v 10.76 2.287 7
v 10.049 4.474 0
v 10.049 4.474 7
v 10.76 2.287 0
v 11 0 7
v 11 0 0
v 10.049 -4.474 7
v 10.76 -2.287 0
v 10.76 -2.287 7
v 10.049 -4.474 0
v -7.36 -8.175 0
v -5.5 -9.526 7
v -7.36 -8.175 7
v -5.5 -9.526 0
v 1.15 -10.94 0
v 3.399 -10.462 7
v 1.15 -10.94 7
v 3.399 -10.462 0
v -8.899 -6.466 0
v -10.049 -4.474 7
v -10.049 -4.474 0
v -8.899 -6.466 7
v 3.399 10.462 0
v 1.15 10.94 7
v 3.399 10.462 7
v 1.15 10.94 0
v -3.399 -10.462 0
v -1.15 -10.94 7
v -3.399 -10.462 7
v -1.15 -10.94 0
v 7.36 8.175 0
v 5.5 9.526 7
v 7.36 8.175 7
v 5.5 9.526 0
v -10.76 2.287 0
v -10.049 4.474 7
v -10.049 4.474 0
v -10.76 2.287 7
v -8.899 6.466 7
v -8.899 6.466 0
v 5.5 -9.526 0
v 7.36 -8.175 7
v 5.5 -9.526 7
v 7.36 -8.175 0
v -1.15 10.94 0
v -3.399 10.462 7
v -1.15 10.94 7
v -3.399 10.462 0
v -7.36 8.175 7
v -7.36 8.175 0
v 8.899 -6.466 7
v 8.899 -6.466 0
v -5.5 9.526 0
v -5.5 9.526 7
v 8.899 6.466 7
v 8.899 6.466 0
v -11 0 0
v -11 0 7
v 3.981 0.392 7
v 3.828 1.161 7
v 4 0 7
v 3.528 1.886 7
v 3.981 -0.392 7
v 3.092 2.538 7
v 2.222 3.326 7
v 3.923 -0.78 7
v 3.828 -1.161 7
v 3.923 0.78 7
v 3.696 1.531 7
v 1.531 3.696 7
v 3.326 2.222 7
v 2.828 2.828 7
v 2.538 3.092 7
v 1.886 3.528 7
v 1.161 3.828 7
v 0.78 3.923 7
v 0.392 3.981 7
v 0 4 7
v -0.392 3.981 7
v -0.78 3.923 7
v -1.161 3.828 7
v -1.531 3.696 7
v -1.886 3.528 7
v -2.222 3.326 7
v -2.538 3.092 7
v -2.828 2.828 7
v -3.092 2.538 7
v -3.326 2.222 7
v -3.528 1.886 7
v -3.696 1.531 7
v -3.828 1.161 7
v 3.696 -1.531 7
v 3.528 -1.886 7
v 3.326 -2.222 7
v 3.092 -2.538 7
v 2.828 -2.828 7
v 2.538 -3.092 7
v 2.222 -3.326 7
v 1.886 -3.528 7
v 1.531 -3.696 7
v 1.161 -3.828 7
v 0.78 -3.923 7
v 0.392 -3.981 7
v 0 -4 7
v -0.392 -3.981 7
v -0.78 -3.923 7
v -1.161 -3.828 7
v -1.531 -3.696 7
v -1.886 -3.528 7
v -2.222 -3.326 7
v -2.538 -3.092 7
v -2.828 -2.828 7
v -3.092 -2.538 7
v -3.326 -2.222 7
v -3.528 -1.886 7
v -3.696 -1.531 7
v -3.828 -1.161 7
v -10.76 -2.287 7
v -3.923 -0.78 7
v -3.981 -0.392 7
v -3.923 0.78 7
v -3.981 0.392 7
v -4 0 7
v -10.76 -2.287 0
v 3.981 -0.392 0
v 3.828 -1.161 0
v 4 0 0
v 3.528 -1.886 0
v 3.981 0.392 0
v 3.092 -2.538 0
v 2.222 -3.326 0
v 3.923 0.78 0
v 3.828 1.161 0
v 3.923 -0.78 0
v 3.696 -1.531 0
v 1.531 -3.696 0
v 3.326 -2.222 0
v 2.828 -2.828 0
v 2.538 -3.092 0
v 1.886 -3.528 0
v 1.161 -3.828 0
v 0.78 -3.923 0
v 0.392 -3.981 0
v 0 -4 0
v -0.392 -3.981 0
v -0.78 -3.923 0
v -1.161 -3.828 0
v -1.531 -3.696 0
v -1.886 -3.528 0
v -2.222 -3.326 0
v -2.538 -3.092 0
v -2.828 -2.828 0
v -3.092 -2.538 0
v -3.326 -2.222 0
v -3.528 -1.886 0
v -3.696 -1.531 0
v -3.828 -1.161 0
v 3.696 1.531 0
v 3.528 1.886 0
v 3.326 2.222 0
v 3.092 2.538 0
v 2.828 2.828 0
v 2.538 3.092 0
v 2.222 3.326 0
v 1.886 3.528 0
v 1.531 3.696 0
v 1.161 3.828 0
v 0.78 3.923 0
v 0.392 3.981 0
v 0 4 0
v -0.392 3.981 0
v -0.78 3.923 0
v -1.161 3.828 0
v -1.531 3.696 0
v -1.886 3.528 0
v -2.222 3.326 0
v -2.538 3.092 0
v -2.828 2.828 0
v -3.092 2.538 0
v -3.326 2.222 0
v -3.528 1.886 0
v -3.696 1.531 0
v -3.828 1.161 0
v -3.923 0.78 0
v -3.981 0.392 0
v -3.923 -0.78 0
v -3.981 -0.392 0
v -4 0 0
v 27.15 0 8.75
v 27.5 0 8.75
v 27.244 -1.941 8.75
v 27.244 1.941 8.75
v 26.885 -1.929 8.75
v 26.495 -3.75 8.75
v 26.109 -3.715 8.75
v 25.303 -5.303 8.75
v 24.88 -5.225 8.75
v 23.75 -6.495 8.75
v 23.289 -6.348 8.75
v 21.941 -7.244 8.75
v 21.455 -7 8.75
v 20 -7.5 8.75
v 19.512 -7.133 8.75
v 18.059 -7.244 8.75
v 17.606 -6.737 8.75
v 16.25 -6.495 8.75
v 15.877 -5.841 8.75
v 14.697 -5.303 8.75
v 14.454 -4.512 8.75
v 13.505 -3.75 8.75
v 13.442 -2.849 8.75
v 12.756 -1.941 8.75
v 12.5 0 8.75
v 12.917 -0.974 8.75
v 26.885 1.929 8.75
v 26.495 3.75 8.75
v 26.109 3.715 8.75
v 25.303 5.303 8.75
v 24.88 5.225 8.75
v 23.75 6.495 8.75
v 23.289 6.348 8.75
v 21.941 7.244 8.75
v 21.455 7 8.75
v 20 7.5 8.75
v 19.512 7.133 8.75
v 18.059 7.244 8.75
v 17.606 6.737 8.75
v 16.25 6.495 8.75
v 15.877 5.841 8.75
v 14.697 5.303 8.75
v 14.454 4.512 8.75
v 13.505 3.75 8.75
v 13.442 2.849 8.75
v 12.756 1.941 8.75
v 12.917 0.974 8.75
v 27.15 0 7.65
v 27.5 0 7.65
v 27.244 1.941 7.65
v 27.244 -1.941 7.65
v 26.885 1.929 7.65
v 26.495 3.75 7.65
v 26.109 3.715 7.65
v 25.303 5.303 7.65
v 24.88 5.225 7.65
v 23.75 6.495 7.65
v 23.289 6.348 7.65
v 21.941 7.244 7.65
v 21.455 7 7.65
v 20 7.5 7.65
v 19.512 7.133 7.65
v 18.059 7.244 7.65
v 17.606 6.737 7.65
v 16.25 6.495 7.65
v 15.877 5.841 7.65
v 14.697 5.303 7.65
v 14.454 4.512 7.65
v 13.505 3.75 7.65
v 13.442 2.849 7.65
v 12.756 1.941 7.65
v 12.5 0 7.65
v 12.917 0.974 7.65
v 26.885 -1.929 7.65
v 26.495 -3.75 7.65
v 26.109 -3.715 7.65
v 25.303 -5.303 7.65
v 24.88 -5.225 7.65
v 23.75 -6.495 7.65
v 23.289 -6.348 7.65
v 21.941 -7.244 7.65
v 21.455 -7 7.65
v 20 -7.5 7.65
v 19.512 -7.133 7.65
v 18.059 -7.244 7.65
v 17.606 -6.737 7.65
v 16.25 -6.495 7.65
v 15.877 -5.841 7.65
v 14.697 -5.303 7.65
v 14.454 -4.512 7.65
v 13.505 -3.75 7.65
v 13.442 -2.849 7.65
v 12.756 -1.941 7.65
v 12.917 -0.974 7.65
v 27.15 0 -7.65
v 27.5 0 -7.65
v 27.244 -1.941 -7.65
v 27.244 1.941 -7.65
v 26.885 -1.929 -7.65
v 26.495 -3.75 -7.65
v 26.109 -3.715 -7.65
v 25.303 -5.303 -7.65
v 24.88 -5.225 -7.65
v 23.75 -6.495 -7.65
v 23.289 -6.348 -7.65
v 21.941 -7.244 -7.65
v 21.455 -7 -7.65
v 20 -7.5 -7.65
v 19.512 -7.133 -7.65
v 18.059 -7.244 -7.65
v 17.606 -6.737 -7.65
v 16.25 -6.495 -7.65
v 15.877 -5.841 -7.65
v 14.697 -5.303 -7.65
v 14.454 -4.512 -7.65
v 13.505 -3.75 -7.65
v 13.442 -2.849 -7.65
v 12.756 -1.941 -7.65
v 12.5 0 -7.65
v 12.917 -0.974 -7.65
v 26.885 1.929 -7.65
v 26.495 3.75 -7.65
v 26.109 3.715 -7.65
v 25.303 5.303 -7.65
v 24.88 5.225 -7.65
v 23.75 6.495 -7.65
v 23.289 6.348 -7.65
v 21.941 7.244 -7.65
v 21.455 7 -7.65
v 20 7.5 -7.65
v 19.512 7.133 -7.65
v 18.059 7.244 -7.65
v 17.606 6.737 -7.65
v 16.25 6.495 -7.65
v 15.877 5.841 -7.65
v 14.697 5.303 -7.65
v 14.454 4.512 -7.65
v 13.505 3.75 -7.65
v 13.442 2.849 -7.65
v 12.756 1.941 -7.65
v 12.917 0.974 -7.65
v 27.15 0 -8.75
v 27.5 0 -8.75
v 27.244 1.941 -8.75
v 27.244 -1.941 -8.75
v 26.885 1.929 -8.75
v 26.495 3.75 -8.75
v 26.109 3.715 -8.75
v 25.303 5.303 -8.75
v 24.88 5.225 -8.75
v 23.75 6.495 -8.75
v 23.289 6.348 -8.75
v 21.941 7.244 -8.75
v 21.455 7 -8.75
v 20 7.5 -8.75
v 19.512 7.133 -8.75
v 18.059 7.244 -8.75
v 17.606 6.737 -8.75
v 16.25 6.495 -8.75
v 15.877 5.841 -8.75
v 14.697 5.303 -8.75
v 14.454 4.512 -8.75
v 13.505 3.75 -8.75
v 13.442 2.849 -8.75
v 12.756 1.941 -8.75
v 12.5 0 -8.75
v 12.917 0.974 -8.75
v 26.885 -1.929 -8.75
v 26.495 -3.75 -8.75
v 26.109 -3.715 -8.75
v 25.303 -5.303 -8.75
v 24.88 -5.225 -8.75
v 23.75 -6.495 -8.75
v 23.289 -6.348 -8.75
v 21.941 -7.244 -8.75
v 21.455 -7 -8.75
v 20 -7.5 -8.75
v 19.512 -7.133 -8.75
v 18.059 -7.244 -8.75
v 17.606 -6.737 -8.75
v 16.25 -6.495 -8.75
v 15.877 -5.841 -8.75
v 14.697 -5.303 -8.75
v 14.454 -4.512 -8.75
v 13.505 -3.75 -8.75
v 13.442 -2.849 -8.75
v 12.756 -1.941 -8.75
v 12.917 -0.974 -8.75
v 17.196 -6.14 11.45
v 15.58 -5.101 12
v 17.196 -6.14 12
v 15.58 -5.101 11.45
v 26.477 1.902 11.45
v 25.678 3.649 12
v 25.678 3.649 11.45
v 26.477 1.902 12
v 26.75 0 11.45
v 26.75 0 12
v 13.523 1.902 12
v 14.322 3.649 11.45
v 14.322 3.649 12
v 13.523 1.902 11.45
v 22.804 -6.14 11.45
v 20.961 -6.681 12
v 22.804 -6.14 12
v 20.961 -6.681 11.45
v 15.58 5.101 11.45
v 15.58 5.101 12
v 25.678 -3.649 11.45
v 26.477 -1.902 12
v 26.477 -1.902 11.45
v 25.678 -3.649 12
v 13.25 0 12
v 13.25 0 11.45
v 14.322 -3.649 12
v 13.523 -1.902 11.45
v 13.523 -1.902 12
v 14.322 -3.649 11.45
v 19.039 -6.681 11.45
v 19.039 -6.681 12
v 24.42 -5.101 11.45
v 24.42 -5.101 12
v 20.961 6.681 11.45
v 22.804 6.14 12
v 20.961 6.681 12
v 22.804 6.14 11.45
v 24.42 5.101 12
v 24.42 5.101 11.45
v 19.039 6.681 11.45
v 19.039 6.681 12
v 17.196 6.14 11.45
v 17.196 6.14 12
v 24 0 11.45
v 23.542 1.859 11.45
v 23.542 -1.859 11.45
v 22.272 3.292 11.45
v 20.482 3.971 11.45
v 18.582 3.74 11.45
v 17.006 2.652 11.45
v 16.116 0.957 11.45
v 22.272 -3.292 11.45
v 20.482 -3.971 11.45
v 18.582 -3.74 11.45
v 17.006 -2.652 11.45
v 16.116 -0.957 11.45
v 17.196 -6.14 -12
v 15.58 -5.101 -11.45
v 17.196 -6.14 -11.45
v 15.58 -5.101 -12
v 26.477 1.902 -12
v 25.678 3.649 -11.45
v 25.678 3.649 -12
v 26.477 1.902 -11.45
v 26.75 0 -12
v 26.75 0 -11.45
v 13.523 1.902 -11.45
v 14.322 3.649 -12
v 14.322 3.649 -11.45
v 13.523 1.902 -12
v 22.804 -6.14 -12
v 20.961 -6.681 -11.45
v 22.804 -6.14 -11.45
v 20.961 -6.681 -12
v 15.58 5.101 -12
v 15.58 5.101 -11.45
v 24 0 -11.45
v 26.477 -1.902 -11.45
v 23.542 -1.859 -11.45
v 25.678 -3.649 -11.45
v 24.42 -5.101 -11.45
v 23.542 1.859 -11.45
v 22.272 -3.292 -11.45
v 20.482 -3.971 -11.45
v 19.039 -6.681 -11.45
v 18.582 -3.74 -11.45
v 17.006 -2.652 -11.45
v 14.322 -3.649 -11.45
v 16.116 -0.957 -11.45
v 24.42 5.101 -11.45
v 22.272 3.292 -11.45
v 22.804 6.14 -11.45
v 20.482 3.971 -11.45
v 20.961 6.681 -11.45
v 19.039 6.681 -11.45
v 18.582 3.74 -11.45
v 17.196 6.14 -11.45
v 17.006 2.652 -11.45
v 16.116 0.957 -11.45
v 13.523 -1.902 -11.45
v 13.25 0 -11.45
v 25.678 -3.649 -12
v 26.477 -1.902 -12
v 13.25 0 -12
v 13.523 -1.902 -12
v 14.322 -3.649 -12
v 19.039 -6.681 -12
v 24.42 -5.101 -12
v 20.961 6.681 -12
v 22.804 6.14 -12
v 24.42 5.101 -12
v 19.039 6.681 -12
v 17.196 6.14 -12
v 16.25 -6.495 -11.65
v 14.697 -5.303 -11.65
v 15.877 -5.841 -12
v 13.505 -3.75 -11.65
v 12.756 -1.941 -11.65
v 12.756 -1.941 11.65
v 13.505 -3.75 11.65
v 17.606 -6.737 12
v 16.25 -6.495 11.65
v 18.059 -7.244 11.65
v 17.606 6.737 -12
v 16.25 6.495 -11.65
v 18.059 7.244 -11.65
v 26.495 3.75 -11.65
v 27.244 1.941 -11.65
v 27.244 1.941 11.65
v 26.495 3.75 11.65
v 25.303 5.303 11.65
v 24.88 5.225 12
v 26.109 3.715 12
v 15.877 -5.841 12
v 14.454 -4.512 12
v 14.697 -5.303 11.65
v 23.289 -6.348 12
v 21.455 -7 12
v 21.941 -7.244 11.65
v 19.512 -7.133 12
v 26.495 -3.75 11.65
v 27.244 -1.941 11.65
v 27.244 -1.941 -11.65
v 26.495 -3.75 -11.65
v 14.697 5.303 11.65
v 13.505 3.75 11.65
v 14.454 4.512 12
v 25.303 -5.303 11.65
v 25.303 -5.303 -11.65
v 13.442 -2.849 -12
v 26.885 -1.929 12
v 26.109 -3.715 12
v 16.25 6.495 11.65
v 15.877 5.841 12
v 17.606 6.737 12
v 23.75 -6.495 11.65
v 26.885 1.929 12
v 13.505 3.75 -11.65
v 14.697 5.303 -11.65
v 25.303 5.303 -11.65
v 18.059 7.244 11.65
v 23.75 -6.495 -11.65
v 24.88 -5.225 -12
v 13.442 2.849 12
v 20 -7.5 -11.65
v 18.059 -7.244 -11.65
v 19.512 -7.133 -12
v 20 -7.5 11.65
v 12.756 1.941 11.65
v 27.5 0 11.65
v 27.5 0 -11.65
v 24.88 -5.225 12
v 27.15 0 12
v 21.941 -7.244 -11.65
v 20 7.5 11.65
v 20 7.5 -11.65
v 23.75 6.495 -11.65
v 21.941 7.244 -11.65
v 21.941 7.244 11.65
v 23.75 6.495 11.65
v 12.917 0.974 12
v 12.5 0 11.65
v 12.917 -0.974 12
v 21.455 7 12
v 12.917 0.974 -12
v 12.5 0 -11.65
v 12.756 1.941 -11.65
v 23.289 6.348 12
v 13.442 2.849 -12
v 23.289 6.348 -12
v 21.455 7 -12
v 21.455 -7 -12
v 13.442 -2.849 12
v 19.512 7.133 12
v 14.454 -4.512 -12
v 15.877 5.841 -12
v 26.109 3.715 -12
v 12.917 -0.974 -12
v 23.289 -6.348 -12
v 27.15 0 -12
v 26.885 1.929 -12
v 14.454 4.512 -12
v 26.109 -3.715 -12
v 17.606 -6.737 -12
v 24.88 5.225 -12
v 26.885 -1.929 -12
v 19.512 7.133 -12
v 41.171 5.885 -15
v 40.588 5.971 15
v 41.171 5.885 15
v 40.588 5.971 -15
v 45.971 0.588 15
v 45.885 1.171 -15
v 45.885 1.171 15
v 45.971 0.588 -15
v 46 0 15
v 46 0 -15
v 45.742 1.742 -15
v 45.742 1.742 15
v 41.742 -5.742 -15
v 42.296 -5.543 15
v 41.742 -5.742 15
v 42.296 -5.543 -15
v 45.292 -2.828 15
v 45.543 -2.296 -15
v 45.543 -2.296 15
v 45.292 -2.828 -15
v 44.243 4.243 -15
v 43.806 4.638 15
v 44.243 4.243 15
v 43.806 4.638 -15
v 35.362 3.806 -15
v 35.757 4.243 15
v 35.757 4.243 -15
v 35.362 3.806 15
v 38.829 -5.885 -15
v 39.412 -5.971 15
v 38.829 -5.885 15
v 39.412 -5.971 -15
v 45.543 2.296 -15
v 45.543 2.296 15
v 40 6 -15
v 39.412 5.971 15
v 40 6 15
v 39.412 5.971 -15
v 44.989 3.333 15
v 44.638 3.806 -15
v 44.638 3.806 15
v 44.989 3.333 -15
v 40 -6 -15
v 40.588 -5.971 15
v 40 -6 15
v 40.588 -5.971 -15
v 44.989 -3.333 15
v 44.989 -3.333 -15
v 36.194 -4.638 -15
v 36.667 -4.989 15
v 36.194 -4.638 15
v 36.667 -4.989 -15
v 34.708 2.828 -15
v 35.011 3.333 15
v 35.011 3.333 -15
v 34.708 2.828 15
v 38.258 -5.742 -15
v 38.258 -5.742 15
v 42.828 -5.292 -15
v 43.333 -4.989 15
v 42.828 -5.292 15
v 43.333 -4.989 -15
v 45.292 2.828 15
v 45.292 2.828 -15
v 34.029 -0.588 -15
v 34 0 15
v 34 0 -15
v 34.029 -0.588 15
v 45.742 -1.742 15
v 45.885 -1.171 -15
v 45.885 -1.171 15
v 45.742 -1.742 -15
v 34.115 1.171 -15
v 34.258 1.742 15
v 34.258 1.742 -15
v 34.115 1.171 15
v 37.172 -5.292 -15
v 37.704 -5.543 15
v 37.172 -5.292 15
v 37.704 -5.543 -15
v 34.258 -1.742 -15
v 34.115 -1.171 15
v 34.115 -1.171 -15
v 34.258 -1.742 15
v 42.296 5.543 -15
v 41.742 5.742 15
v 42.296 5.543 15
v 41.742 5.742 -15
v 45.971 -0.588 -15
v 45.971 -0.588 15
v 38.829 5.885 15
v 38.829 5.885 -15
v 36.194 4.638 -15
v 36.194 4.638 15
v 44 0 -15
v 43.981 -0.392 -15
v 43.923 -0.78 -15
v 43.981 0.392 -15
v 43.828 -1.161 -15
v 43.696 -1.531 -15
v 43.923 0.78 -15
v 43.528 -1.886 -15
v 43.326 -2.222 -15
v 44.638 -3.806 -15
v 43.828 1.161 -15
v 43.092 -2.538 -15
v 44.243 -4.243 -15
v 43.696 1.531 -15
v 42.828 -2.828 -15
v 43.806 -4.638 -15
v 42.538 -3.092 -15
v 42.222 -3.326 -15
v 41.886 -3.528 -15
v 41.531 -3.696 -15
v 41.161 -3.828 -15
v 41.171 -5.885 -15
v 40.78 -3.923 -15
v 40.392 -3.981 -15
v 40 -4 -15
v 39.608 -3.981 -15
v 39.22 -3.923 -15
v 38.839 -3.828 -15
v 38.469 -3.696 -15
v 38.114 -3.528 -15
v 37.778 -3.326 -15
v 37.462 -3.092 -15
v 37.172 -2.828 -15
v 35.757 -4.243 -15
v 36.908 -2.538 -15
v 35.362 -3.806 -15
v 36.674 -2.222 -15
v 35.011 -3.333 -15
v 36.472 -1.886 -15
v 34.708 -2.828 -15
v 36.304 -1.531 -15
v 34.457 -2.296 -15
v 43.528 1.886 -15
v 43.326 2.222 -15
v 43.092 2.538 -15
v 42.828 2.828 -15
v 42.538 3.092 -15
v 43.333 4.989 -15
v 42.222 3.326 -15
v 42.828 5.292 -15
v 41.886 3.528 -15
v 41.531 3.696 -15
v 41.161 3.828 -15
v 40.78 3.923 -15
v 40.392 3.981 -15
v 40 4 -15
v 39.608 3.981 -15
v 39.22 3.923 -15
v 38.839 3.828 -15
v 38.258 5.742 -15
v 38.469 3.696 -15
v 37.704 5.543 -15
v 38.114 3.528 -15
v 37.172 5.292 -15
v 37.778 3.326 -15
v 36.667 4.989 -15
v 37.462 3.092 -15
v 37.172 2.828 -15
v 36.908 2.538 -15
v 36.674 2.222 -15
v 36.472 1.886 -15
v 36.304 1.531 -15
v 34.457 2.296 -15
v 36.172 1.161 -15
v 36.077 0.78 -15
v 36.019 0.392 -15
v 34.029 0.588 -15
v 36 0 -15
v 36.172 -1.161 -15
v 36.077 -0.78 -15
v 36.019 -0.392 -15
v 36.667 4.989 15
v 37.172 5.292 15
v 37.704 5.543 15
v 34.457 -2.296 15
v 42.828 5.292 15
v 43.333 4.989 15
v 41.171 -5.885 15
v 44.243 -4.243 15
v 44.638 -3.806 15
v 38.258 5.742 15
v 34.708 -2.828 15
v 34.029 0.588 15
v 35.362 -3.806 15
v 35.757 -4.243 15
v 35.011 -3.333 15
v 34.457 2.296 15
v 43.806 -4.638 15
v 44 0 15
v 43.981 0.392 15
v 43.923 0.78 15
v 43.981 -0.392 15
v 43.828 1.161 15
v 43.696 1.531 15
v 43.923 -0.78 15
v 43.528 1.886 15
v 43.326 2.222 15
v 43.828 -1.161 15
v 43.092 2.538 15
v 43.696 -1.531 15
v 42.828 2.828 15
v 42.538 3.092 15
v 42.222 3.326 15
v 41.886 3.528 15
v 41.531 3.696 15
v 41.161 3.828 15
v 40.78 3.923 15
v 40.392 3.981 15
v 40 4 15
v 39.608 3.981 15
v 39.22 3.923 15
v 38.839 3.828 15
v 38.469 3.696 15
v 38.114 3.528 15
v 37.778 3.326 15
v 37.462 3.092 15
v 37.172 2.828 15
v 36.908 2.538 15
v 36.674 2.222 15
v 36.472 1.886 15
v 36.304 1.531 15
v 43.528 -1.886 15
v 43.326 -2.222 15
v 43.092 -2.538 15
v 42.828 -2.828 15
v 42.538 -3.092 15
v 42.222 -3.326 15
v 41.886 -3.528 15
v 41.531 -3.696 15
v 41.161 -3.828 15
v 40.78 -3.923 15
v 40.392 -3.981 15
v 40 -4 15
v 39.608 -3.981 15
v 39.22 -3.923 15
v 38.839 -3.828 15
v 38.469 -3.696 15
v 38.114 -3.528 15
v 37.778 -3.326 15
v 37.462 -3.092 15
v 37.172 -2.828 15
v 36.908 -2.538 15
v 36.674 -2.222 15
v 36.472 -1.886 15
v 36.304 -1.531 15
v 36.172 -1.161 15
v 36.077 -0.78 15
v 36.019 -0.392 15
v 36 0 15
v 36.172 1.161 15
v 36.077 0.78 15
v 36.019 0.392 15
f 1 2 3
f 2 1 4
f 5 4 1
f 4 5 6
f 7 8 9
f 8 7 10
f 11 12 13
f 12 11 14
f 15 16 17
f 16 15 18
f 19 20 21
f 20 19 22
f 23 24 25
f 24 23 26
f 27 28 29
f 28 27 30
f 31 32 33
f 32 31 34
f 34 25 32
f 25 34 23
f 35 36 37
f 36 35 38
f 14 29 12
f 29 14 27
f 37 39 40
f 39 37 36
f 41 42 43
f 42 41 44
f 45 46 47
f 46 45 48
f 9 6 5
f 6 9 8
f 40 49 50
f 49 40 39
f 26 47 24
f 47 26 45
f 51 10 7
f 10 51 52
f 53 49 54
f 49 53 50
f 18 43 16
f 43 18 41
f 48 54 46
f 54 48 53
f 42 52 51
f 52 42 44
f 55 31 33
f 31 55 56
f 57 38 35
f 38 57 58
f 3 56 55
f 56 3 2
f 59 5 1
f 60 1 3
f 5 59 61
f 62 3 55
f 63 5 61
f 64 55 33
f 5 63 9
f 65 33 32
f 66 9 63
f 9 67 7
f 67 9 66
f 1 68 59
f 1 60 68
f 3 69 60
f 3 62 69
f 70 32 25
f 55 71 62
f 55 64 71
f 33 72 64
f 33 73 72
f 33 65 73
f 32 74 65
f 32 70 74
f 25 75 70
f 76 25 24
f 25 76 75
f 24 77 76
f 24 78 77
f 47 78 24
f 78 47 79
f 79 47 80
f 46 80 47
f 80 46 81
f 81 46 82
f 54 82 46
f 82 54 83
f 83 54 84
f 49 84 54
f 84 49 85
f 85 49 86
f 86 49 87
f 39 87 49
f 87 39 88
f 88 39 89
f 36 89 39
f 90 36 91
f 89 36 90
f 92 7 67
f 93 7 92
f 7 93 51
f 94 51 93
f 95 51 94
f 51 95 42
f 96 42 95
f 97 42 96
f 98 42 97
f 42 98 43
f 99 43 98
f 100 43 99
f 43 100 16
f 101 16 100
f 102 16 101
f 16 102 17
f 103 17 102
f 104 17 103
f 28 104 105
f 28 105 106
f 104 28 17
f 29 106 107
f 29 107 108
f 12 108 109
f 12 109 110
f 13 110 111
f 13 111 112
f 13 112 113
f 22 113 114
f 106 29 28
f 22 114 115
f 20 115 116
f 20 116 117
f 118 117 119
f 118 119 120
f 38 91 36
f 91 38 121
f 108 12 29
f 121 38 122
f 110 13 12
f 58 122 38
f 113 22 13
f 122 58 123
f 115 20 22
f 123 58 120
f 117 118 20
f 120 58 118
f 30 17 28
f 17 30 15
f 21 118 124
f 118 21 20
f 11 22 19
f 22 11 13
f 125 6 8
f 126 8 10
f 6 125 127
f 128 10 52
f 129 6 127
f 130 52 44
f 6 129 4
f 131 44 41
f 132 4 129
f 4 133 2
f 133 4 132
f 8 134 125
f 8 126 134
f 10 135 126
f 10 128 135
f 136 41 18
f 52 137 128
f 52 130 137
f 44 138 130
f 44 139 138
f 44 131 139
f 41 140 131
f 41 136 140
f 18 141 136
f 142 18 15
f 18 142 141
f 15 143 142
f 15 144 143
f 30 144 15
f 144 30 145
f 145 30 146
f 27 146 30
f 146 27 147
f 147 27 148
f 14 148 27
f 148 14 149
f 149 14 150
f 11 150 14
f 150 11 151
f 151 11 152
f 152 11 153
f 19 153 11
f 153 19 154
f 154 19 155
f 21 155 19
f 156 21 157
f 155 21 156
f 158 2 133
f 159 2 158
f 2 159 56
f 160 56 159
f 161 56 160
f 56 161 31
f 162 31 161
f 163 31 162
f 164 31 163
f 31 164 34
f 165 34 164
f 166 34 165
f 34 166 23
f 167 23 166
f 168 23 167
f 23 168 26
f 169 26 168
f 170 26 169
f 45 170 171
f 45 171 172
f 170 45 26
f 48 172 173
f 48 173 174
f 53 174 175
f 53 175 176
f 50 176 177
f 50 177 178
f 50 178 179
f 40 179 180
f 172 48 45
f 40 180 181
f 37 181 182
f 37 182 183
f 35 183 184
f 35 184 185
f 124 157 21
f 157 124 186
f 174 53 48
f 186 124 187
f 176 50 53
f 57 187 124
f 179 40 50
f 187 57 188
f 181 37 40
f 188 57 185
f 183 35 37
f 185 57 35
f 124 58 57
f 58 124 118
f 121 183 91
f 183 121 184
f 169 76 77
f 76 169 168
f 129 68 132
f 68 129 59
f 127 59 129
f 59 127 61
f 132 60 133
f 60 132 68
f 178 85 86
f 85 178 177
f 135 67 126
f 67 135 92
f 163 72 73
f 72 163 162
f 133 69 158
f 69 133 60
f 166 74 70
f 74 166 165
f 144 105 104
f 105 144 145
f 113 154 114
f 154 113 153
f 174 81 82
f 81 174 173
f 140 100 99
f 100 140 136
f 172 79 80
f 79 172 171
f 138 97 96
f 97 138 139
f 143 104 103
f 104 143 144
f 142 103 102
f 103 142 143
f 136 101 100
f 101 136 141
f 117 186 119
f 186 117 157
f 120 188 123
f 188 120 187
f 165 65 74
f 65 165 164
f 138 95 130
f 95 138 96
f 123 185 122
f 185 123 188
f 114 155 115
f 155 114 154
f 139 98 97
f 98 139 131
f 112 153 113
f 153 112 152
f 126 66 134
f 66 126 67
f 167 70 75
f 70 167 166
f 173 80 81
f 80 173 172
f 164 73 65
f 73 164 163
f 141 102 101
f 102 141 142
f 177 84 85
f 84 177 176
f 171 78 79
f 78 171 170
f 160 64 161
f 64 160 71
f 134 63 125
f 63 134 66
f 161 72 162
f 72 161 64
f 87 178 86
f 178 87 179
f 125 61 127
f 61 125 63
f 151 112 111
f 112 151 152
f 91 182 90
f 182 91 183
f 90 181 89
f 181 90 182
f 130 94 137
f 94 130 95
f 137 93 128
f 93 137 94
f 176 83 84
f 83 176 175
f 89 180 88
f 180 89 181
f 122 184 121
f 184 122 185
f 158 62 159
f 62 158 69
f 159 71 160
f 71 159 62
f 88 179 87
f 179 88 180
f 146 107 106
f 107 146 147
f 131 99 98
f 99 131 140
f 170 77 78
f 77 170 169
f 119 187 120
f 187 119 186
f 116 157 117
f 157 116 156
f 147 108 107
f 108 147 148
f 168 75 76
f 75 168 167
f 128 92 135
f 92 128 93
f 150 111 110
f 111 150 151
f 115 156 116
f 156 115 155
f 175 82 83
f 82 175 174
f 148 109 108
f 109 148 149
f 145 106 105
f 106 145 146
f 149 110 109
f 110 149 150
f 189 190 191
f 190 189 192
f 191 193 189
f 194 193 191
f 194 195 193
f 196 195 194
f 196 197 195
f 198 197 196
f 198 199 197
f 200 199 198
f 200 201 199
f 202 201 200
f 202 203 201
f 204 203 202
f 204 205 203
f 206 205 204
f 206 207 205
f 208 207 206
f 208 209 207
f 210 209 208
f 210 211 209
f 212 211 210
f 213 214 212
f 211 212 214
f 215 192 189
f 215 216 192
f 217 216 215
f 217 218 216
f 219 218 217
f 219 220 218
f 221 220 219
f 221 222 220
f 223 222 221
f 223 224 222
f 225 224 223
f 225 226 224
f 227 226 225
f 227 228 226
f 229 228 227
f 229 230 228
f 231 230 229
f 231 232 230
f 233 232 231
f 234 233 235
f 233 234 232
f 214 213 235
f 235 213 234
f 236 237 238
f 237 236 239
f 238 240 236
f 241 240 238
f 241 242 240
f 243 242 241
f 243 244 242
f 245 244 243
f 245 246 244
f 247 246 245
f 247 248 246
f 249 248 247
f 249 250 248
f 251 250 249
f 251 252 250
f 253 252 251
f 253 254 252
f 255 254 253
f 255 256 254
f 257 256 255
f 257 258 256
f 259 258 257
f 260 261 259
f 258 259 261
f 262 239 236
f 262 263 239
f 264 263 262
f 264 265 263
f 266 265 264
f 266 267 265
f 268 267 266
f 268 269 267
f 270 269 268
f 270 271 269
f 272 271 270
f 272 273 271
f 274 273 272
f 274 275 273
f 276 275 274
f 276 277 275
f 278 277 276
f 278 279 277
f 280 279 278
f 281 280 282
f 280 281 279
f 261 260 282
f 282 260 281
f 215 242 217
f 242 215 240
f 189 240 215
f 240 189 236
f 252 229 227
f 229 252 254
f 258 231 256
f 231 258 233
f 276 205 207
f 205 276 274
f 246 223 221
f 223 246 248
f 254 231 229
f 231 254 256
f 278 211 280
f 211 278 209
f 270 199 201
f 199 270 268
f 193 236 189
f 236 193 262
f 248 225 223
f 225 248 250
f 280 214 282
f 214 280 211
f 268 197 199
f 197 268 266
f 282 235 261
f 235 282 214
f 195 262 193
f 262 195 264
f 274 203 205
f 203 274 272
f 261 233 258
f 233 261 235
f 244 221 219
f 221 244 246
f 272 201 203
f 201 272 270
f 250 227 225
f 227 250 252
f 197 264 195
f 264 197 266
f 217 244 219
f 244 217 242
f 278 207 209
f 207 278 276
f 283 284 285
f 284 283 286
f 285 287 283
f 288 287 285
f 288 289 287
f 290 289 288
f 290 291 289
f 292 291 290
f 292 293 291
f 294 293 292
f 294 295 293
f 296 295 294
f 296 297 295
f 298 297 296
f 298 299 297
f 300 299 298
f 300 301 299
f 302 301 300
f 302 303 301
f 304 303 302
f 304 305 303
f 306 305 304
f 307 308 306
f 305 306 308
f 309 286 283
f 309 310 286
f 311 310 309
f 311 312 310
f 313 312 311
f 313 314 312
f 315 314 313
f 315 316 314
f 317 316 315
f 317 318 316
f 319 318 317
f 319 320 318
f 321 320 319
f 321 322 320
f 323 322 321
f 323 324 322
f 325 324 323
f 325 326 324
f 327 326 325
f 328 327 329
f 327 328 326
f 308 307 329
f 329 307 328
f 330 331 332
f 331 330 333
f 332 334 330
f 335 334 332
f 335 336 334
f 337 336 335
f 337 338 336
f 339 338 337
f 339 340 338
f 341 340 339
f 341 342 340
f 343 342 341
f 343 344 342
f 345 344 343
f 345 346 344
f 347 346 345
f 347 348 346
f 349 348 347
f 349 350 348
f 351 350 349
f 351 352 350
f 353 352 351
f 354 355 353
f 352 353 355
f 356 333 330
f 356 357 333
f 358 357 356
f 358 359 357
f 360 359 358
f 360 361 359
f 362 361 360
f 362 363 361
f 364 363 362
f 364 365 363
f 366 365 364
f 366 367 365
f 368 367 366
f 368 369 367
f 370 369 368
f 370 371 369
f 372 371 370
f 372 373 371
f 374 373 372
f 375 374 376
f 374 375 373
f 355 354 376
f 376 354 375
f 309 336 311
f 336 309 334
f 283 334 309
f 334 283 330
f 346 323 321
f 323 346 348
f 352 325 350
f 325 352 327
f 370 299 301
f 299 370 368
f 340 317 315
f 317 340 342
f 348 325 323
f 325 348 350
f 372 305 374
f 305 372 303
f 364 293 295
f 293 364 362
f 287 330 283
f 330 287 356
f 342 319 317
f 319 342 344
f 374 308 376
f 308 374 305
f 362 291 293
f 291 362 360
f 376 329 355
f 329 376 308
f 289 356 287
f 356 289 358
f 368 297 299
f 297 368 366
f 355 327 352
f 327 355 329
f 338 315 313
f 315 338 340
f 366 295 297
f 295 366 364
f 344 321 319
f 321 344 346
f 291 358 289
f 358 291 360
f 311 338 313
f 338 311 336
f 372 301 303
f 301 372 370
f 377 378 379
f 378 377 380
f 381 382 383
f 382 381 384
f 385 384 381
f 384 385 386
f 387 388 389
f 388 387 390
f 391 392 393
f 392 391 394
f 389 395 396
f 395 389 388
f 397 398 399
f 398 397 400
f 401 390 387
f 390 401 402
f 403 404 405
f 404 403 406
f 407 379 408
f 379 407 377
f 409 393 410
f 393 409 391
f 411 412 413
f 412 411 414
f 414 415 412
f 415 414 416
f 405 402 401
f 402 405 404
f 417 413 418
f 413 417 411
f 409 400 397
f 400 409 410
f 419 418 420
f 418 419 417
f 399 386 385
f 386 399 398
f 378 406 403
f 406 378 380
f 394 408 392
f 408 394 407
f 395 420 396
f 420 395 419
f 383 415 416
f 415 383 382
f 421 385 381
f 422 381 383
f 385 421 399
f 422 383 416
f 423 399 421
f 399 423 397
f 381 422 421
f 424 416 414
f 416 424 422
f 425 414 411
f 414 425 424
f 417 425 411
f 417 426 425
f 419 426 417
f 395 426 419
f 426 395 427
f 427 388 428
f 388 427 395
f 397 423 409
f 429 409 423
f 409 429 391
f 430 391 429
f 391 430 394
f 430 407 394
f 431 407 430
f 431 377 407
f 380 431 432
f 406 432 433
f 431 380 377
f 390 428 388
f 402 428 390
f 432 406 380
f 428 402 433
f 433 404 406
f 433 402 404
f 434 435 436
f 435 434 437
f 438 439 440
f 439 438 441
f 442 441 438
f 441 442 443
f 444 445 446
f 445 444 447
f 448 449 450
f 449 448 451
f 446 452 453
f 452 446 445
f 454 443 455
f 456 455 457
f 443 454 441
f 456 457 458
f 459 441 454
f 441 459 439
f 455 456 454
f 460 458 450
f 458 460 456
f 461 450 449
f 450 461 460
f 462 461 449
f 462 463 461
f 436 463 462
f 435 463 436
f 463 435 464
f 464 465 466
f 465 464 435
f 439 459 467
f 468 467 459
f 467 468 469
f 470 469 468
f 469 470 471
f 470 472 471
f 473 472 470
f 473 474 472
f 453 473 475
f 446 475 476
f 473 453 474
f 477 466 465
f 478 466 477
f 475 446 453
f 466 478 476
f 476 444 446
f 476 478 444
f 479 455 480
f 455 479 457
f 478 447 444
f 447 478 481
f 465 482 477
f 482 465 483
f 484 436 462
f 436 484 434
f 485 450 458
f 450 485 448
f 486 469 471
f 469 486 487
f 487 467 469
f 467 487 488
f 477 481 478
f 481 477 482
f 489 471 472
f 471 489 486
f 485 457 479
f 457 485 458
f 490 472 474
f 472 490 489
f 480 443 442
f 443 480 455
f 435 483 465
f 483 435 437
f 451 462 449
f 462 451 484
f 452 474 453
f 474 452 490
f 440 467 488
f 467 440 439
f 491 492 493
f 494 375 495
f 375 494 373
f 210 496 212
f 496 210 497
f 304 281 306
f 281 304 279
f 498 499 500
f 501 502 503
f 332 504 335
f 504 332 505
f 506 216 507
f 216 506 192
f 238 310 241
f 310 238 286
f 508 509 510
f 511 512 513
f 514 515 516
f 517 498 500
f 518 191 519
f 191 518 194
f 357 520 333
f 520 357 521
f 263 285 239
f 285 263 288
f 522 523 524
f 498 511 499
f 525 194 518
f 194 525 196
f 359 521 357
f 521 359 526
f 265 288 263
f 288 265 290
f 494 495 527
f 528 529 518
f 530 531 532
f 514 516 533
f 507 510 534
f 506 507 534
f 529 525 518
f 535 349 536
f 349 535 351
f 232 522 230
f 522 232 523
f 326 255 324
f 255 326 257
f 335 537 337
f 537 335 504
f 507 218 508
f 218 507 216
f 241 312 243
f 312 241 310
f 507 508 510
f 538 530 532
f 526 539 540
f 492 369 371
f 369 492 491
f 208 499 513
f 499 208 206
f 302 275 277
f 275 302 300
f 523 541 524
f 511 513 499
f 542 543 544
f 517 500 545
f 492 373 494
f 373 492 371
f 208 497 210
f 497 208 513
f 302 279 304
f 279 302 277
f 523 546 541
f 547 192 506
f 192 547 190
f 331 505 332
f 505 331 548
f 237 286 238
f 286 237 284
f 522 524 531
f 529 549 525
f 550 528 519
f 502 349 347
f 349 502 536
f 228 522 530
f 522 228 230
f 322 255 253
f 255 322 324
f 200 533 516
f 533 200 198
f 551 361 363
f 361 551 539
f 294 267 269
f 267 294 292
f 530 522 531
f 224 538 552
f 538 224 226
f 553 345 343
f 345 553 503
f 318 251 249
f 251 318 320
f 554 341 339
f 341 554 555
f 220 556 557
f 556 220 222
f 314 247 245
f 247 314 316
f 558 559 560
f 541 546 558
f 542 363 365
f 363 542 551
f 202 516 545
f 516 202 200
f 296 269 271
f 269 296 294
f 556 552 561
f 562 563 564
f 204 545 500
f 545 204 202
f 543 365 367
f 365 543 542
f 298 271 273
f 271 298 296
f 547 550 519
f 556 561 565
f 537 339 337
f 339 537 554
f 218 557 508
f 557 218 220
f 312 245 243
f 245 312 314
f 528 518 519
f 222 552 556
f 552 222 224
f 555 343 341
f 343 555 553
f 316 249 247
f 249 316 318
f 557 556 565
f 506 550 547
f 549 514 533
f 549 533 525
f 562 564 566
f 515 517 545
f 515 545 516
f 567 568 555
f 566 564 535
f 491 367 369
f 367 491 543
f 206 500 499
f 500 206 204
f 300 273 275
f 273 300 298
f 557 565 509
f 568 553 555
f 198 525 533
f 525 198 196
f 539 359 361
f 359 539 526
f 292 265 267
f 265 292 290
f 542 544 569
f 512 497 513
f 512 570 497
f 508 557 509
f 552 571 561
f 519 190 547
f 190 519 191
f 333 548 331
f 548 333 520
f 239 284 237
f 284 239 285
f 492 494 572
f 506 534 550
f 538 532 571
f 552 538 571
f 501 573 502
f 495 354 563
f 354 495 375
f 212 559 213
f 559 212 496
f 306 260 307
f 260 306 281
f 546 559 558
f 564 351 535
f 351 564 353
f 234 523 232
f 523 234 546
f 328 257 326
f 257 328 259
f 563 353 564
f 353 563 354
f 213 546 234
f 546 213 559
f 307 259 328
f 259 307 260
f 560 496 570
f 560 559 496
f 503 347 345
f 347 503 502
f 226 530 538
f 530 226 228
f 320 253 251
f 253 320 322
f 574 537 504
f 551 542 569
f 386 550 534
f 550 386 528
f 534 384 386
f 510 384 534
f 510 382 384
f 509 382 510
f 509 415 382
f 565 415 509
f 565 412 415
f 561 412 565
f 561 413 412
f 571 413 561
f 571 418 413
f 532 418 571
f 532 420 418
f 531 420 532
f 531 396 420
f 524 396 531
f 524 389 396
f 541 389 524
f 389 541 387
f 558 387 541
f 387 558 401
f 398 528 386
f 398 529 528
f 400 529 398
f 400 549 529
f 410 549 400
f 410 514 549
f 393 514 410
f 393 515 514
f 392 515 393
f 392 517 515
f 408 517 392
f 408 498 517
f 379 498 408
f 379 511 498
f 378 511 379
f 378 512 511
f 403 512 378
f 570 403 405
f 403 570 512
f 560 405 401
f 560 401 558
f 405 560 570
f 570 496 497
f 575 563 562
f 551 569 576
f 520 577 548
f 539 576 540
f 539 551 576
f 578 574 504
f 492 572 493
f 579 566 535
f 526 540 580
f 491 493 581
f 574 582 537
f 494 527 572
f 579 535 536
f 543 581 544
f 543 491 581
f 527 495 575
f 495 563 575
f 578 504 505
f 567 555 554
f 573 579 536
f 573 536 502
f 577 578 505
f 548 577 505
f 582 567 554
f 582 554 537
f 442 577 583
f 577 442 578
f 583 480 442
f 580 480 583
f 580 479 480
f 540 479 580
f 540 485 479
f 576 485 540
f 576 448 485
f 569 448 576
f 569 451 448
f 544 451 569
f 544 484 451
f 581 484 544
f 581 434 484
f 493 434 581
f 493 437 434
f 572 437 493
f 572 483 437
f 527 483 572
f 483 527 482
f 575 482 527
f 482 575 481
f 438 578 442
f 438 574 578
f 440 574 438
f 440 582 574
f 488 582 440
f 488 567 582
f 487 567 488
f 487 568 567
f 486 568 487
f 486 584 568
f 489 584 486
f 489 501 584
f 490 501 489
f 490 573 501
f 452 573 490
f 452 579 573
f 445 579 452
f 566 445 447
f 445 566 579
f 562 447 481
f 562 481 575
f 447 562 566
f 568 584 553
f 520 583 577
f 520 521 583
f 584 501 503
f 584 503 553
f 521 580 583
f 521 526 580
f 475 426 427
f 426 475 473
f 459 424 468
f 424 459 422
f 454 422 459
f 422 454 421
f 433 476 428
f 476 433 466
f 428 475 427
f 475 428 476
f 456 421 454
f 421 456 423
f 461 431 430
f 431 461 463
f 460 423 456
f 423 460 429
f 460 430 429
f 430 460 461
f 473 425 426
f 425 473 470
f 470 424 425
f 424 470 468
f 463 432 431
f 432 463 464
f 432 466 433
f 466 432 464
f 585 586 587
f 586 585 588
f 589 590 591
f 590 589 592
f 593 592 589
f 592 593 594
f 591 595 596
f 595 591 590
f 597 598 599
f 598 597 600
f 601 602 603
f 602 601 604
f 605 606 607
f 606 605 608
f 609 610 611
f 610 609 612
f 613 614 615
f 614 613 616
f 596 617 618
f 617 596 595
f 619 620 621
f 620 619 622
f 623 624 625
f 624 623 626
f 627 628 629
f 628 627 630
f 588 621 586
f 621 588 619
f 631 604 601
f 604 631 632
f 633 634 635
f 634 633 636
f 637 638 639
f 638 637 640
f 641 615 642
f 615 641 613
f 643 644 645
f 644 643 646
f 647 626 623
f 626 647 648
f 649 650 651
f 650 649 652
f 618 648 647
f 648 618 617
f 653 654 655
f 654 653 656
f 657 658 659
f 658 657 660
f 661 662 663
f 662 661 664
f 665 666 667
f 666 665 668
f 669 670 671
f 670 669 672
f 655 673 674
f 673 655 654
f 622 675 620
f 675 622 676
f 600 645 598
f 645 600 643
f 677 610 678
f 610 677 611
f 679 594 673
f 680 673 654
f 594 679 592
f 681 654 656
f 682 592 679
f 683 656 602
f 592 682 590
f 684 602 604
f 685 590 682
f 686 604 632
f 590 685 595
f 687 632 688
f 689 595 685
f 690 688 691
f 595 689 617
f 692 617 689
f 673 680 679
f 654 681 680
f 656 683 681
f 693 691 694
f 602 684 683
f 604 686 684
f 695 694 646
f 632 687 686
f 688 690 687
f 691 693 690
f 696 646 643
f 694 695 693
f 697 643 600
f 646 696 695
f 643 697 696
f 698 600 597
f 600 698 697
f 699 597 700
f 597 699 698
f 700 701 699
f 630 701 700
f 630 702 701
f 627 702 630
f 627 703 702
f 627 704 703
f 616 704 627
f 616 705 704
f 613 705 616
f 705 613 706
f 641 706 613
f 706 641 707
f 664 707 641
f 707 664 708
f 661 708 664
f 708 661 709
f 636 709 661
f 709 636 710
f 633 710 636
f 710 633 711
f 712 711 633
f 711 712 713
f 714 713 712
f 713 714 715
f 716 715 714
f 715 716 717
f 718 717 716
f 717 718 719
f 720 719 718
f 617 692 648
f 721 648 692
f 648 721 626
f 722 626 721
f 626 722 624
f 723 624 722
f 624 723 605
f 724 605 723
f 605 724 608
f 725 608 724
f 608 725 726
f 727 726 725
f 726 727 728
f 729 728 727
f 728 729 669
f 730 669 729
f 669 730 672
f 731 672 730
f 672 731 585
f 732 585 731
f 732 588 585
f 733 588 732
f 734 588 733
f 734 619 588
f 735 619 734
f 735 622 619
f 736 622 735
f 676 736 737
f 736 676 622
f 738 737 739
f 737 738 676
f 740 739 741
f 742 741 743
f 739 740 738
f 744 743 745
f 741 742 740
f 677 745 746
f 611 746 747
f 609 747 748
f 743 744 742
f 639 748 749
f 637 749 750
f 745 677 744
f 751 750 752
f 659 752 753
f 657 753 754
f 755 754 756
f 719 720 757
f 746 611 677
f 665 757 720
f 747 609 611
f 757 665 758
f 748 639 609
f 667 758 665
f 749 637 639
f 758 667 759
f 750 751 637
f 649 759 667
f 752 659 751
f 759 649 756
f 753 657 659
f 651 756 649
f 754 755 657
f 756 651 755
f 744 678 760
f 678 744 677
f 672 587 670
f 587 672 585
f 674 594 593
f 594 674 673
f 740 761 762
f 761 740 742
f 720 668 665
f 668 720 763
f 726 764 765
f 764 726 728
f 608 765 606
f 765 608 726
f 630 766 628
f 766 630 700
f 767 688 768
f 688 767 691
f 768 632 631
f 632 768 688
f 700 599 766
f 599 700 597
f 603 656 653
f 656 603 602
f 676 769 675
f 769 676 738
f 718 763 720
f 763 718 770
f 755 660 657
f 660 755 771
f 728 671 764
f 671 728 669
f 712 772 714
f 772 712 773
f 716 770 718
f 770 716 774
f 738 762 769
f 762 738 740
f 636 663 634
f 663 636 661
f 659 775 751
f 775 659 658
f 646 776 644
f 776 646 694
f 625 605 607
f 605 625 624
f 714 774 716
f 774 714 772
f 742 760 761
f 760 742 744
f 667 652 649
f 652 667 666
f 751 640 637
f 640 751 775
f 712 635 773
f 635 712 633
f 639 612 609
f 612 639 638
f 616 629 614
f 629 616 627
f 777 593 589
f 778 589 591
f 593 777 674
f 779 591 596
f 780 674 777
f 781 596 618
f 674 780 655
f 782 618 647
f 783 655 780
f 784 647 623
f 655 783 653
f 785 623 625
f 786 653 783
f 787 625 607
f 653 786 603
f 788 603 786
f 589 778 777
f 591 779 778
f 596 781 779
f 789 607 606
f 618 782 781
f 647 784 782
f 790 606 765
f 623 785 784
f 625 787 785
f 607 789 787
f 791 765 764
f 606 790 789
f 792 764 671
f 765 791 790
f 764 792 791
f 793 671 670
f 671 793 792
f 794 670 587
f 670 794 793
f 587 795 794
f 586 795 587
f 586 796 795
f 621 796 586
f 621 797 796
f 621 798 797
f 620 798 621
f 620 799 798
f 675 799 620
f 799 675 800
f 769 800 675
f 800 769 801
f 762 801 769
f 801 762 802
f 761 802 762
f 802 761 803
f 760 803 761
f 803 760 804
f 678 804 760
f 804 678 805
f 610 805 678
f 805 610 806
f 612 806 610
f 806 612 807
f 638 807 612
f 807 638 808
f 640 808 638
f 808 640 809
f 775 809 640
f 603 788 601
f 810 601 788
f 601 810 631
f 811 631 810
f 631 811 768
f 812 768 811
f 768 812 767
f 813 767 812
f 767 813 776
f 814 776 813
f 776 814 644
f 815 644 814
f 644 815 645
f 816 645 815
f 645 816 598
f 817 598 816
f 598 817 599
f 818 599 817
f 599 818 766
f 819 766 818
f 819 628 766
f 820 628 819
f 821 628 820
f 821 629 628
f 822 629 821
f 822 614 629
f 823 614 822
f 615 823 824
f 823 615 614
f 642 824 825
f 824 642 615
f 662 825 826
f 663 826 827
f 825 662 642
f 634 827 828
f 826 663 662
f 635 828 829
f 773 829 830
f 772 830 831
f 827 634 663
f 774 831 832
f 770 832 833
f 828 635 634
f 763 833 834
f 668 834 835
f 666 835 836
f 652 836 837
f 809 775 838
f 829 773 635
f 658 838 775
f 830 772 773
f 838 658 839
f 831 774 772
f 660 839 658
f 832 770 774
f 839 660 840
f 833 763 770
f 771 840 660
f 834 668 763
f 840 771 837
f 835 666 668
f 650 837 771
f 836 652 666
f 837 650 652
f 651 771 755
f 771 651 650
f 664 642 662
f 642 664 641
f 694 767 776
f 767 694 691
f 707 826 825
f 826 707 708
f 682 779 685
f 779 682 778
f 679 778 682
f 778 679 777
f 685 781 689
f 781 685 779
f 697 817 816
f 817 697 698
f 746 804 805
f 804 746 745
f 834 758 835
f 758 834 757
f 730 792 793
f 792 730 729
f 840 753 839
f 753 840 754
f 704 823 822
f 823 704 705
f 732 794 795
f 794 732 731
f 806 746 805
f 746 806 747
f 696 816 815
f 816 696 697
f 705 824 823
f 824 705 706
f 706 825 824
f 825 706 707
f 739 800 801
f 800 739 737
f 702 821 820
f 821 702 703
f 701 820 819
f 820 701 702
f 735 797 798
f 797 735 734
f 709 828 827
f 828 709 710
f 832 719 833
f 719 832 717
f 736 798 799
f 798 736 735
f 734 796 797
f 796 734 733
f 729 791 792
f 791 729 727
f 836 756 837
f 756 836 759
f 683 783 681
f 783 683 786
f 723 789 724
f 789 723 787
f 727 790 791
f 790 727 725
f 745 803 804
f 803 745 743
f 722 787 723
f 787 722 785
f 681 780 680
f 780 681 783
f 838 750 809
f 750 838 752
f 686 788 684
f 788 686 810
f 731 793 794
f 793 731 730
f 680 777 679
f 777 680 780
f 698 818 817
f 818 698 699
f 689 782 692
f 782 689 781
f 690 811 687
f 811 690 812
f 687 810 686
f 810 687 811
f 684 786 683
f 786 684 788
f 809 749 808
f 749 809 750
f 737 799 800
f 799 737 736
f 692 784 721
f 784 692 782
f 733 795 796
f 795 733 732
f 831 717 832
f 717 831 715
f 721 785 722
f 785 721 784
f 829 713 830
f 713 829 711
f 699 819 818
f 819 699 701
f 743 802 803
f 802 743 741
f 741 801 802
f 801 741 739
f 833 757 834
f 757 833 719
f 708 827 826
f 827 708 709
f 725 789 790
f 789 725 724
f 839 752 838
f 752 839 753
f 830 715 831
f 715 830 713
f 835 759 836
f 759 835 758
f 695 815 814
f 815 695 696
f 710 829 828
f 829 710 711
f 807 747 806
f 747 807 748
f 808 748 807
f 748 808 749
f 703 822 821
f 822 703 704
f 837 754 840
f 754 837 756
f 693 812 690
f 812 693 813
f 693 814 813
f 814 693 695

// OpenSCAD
// file: Linear_Bearing.scad
// Open SCAD model of linear Bearing LM-8-UU & KB-12-WW

//     LM-8-UU        KB-12-WW
//	D_Int =  8.0	D_Int = 12.0
//	D_Ext = 15.0	D_Ext = 22.0
//	D_1   = 14.3	D_1   = 21.0
//	L     = 24.0	L     = 32.0
//	W     =  1.1	W     =  1.3
//	B     = 17.5	B     = 22.9



module groove(d1, d2, w) {
	difference() {
		cylinder(r=d1/2+1, h=w, center=true);
		cylinder(r=d2/2  , h=w, center=true);
	}
}

module lb(D_Int=8, D_Ext=15, D_1=14.3, L=24, W=1.1, B=17.5) {
chamf = D_Ext - D_1;
	difference() {
		hull() {
			cylinder(r=D_Ext/2, h=L-chamf, center=true);
			cylinder(r=D_1  /2, h=L      , center=true);
		}
		cylinder(r=D_Int/2, h=L+2    , center=true);
		translate([0, 0, B/2-W/2]) groove(D_Ext, D_1, W);
		translate([0, 0,-B/2+W/2]) groove(D_Ext, D_1, W);
		translate([0, 0,     L/2]) groove(D_Ext-(D_Ext-D_Int)/2, 1, W);
		translate([0, 0,    -L/2]) groove(D_Ext-(D_Ext-D_Int)/2, 1, W);
	}
}


module linear_bearing(linear_bearing_type) {
	if(linear_bearing_type == "LM-8-UU") {   //LM-8-UU
		lb(D_Int=8, D_Ext=15, D_1=14.3, L=24, W=1.1, B=17.5);
	}
	else {
		if(linear_bearing_type == "KB-12-WW") {   //KB-12-WW
			lb(D_Int=12, D_Ext=22, D_1=21, L=32, W=1.3, B=22.9);
		}
	}
}


translate([0,  0, 12]) linear_bearing("LM-8-UU" );
translate([0, 20, 16]) linear_bearing("KB-12-WW");
// file: Param.scad
//axe : disponible : 320*2/350*2/370*2/470*4/405*2
axe_x = 350;
axe_y = 405;
axe_z = 370;

Frame_e = 16;
coulisse_d = 8;
angle_e=5;

// Constant
r608z_d=8;
r608z_D=22;
r608z_e=7;

nema17_L=42;
nema17_axe_d=5.2;

Pulley_GT2_8_e=17;
Pulley_GT2_8_D=26;

BagueLaiton_D=12;

_globalResolution = 64;

// Data
Frame_L = axe_x-Pulley_GT2_8_e-angle_e;
Frame_l = axe_y-Pulley_GT2_8_e-angle_e;
Frame_h = axe_z;

coulisse_e = 3*coulisse_d;
coulisse_eh = r608z_D+5;
coulisse_ec = r608z_D+12;

angle_h=coulisse_e+coulisse_eh+r608z_D;
// main file
include <Param.scad>;
use <Linear_Bearing.scad>;

module bearing608z(){
    color("Silver")
    difference(){
        cylinder(d=r608z_D,h=r608z_e,fn=_globalResolution);
        translate ([0,0, -0.05]) cylinder(d=r608z_d,h=r608z_e+0.1,$fn=_globalResolution);
    };
}

module lm8uu() {
    color("Silver")
    linear_bearing("LM-8-UU");
}
    
module bagueLaiton_8_12_30() {
    d=8;
    D=12;
    l=30;
    color("Goldenrod")
    translate ([0,0,-l/2])
    difference(){
        cylinder(d=D,h=l,$fn=_globalResolution);
        translate ([0,0, -0.05]) cylinder(d=d,h=l+0.1,$fn=_globalResolution);
    };
}

bearing608z();
translate([20,0,0]) lm8uu();
translate([40,0,0]) bagueLaiton_8_12_30();
